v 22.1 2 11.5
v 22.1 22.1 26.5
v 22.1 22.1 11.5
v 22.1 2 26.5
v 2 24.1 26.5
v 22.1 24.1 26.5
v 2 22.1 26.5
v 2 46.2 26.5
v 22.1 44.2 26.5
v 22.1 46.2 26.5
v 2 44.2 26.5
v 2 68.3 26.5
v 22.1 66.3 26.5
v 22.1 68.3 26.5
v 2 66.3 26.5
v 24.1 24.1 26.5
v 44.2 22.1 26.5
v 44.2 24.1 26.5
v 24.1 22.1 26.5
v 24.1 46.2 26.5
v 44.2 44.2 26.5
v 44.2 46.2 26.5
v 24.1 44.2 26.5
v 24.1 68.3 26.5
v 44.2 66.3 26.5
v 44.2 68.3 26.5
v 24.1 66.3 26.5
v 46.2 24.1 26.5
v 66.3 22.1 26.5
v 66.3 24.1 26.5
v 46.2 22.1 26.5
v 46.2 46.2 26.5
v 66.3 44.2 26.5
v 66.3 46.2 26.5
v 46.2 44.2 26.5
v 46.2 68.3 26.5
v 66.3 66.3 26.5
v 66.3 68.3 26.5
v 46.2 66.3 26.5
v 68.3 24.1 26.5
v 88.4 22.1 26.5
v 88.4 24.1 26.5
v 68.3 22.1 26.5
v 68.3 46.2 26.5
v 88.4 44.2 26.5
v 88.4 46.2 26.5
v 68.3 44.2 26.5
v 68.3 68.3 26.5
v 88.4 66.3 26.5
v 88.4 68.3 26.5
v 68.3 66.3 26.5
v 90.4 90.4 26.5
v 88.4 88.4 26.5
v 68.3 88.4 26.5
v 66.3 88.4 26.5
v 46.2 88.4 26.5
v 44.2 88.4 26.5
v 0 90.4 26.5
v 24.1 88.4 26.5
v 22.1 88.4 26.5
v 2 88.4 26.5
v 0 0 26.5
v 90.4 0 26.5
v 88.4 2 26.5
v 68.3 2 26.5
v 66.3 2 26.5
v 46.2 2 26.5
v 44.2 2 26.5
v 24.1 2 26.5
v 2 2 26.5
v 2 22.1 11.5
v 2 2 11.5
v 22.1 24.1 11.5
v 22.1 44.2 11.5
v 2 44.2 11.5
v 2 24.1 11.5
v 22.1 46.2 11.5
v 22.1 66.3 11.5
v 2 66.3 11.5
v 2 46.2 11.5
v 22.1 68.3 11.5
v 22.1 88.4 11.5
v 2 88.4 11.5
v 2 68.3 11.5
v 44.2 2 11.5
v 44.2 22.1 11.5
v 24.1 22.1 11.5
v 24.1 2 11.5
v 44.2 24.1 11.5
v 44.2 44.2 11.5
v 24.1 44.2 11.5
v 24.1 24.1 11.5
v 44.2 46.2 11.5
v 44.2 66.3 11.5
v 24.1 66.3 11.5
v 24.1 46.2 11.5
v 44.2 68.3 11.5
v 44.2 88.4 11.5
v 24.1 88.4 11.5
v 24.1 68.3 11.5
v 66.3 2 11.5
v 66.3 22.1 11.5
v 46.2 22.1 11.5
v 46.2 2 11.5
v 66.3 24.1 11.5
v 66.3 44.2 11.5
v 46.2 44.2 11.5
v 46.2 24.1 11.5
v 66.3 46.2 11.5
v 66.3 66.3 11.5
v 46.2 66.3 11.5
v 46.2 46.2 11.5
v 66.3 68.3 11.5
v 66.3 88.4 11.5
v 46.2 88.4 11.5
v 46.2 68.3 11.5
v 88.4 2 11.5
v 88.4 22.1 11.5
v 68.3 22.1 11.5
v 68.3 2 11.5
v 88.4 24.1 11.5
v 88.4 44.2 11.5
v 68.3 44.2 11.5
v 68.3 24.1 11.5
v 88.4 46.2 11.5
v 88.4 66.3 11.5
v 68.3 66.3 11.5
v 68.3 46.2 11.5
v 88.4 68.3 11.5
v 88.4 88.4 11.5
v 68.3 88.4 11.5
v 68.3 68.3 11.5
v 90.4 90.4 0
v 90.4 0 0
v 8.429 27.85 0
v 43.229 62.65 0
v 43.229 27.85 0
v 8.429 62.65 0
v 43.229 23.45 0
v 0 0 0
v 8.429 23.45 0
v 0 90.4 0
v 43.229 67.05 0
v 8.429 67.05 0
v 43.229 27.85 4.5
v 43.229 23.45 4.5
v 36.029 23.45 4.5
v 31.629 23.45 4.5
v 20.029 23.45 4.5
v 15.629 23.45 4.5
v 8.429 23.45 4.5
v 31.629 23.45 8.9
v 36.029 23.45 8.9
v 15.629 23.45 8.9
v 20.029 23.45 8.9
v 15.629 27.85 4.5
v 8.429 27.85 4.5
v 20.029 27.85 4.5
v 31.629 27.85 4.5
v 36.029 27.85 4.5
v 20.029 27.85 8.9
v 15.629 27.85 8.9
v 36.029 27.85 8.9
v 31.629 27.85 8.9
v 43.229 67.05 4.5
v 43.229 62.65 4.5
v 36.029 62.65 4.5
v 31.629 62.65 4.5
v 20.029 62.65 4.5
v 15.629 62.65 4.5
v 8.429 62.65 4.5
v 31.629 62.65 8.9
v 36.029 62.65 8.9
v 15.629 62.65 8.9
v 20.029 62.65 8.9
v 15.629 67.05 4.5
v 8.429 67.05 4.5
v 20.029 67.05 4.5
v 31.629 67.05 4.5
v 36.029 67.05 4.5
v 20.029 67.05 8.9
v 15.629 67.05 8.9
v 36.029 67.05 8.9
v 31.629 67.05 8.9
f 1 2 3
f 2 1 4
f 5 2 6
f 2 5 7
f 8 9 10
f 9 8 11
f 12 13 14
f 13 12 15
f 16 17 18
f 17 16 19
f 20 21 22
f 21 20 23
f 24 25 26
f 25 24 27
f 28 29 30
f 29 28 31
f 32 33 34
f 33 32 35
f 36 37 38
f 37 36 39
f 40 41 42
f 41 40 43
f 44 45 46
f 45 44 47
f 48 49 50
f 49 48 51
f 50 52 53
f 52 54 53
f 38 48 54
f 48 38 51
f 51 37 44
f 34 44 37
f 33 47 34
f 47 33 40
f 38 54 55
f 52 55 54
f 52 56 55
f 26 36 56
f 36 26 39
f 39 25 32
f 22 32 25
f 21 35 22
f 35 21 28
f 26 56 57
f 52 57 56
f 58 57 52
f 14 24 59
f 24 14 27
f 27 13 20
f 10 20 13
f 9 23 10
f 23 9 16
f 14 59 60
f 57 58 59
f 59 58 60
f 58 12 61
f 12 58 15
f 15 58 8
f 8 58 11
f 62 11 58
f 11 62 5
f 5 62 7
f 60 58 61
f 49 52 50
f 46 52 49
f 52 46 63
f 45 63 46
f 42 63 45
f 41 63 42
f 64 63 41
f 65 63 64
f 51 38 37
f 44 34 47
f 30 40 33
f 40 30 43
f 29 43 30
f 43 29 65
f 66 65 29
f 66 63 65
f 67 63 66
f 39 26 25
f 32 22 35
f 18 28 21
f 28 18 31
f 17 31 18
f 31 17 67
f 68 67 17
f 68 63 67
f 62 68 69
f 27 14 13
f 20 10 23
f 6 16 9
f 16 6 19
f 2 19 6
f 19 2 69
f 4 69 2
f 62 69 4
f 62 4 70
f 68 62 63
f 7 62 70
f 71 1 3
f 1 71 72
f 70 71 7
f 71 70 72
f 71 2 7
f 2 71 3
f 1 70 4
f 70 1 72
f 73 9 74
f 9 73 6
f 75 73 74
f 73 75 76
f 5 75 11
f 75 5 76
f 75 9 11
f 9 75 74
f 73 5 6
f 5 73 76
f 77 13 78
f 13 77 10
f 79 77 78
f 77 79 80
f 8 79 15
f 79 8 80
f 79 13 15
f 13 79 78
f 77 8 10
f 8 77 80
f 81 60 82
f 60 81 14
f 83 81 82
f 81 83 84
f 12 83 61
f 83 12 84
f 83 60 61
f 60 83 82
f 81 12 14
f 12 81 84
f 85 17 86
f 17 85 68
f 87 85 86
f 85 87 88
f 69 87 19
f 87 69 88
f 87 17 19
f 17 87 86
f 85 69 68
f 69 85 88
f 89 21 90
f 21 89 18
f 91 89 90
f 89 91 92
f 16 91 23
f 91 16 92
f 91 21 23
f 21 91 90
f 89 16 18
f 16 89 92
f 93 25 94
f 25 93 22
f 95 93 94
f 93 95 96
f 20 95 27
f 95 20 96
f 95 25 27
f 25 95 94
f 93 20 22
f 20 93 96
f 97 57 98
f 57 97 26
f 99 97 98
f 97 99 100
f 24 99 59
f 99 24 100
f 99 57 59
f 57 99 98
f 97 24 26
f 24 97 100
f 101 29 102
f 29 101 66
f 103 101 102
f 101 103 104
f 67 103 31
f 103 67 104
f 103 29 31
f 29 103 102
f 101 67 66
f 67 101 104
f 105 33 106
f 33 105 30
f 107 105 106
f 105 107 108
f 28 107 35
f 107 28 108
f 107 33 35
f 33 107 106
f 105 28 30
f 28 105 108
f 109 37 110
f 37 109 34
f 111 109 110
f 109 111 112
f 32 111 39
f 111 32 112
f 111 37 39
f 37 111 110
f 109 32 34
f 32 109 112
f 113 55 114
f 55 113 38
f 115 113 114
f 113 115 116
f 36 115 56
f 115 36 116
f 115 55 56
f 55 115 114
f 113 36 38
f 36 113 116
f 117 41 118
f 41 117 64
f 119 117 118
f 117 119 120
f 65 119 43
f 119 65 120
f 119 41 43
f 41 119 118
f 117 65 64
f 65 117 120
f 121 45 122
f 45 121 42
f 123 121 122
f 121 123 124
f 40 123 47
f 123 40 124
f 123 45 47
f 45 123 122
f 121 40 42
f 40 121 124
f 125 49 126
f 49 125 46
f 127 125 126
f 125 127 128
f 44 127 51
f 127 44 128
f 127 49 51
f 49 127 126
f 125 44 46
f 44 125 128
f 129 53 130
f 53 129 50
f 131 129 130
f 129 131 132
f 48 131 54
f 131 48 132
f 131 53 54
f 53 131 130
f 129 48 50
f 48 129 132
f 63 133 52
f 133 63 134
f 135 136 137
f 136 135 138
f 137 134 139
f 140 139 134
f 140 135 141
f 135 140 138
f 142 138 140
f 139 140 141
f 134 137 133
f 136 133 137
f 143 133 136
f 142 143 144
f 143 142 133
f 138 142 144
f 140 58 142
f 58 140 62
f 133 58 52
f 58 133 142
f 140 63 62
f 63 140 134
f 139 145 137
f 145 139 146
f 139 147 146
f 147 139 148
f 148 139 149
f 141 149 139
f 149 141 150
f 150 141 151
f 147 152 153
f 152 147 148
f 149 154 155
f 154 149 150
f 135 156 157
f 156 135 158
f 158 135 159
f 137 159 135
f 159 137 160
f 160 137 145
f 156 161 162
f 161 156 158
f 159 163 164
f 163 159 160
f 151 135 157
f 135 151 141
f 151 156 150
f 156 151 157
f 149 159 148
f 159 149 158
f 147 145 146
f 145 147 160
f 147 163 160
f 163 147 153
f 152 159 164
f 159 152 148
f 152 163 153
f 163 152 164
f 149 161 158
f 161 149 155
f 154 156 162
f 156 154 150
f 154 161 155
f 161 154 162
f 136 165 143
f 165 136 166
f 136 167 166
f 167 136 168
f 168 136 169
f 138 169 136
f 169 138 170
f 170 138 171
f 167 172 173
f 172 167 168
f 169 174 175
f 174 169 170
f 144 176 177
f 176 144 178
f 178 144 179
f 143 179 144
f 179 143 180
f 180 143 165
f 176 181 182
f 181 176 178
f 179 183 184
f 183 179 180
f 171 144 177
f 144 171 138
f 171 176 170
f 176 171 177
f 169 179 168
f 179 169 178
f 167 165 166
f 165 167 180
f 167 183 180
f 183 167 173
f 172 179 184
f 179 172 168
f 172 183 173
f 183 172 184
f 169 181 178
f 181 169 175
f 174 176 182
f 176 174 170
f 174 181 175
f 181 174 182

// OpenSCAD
cube_size = 20.1;
wall_thickness = 2;
depth = 15;
grid_size = 4;

total_width = grid_size * cube_size + (grid_size + 1) * wall_thickness;
total_height = total_width;

// pegboard
length = 34.8;
width = 4.5;
height = 4.4;
cube_side = 4.4;
cube_distance_center = 8;
cube_gap = 16;


peg_1 = (total_width - 34.7) / 2;
peg_2 = peg_1 + 34.7 + width;

module hook_shape() {
    translate([-length/2, -width/2, 0])
        cube([length, width, height]);

    translate([cube_distance_center - cube_side/2, width/2, 0])
        cube([cube_side, cube_side, cube_side]);

    translate([-cube_distance_center - cube_side/2, width/2, 0])
        cube([cube_side, cube_side, cube_side]);
}

module base_panel_with_bottom() {
    difference() {
        cube([total_width, total_height, depth + wall_thickness + 9.5]);

        for (x = [0 : grid_size - 1]) {
            for (y = [0 : grid_size - 1]) {
                translate([x * (cube_size + wall_thickness) + wall_thickness, 
                           y * (cube_size + wall_thickness) + wall_thickness, 
                           wall_thickness + 9.5])
                    cube([cube_size, cube_size, depth]);
            }
        }
    }
}

module main() {
    difference() {
        base_panel_with_bottom();
        
        translate([total_width/3.5, peg_1, 2.25])
        rotate([90, 0, 0])
          hook_shape();
        
        translate([total_width/3.5, peg_2, 2.25])
        rotate([90, 0, 0])
          hook_shape();
    }
}

main();
